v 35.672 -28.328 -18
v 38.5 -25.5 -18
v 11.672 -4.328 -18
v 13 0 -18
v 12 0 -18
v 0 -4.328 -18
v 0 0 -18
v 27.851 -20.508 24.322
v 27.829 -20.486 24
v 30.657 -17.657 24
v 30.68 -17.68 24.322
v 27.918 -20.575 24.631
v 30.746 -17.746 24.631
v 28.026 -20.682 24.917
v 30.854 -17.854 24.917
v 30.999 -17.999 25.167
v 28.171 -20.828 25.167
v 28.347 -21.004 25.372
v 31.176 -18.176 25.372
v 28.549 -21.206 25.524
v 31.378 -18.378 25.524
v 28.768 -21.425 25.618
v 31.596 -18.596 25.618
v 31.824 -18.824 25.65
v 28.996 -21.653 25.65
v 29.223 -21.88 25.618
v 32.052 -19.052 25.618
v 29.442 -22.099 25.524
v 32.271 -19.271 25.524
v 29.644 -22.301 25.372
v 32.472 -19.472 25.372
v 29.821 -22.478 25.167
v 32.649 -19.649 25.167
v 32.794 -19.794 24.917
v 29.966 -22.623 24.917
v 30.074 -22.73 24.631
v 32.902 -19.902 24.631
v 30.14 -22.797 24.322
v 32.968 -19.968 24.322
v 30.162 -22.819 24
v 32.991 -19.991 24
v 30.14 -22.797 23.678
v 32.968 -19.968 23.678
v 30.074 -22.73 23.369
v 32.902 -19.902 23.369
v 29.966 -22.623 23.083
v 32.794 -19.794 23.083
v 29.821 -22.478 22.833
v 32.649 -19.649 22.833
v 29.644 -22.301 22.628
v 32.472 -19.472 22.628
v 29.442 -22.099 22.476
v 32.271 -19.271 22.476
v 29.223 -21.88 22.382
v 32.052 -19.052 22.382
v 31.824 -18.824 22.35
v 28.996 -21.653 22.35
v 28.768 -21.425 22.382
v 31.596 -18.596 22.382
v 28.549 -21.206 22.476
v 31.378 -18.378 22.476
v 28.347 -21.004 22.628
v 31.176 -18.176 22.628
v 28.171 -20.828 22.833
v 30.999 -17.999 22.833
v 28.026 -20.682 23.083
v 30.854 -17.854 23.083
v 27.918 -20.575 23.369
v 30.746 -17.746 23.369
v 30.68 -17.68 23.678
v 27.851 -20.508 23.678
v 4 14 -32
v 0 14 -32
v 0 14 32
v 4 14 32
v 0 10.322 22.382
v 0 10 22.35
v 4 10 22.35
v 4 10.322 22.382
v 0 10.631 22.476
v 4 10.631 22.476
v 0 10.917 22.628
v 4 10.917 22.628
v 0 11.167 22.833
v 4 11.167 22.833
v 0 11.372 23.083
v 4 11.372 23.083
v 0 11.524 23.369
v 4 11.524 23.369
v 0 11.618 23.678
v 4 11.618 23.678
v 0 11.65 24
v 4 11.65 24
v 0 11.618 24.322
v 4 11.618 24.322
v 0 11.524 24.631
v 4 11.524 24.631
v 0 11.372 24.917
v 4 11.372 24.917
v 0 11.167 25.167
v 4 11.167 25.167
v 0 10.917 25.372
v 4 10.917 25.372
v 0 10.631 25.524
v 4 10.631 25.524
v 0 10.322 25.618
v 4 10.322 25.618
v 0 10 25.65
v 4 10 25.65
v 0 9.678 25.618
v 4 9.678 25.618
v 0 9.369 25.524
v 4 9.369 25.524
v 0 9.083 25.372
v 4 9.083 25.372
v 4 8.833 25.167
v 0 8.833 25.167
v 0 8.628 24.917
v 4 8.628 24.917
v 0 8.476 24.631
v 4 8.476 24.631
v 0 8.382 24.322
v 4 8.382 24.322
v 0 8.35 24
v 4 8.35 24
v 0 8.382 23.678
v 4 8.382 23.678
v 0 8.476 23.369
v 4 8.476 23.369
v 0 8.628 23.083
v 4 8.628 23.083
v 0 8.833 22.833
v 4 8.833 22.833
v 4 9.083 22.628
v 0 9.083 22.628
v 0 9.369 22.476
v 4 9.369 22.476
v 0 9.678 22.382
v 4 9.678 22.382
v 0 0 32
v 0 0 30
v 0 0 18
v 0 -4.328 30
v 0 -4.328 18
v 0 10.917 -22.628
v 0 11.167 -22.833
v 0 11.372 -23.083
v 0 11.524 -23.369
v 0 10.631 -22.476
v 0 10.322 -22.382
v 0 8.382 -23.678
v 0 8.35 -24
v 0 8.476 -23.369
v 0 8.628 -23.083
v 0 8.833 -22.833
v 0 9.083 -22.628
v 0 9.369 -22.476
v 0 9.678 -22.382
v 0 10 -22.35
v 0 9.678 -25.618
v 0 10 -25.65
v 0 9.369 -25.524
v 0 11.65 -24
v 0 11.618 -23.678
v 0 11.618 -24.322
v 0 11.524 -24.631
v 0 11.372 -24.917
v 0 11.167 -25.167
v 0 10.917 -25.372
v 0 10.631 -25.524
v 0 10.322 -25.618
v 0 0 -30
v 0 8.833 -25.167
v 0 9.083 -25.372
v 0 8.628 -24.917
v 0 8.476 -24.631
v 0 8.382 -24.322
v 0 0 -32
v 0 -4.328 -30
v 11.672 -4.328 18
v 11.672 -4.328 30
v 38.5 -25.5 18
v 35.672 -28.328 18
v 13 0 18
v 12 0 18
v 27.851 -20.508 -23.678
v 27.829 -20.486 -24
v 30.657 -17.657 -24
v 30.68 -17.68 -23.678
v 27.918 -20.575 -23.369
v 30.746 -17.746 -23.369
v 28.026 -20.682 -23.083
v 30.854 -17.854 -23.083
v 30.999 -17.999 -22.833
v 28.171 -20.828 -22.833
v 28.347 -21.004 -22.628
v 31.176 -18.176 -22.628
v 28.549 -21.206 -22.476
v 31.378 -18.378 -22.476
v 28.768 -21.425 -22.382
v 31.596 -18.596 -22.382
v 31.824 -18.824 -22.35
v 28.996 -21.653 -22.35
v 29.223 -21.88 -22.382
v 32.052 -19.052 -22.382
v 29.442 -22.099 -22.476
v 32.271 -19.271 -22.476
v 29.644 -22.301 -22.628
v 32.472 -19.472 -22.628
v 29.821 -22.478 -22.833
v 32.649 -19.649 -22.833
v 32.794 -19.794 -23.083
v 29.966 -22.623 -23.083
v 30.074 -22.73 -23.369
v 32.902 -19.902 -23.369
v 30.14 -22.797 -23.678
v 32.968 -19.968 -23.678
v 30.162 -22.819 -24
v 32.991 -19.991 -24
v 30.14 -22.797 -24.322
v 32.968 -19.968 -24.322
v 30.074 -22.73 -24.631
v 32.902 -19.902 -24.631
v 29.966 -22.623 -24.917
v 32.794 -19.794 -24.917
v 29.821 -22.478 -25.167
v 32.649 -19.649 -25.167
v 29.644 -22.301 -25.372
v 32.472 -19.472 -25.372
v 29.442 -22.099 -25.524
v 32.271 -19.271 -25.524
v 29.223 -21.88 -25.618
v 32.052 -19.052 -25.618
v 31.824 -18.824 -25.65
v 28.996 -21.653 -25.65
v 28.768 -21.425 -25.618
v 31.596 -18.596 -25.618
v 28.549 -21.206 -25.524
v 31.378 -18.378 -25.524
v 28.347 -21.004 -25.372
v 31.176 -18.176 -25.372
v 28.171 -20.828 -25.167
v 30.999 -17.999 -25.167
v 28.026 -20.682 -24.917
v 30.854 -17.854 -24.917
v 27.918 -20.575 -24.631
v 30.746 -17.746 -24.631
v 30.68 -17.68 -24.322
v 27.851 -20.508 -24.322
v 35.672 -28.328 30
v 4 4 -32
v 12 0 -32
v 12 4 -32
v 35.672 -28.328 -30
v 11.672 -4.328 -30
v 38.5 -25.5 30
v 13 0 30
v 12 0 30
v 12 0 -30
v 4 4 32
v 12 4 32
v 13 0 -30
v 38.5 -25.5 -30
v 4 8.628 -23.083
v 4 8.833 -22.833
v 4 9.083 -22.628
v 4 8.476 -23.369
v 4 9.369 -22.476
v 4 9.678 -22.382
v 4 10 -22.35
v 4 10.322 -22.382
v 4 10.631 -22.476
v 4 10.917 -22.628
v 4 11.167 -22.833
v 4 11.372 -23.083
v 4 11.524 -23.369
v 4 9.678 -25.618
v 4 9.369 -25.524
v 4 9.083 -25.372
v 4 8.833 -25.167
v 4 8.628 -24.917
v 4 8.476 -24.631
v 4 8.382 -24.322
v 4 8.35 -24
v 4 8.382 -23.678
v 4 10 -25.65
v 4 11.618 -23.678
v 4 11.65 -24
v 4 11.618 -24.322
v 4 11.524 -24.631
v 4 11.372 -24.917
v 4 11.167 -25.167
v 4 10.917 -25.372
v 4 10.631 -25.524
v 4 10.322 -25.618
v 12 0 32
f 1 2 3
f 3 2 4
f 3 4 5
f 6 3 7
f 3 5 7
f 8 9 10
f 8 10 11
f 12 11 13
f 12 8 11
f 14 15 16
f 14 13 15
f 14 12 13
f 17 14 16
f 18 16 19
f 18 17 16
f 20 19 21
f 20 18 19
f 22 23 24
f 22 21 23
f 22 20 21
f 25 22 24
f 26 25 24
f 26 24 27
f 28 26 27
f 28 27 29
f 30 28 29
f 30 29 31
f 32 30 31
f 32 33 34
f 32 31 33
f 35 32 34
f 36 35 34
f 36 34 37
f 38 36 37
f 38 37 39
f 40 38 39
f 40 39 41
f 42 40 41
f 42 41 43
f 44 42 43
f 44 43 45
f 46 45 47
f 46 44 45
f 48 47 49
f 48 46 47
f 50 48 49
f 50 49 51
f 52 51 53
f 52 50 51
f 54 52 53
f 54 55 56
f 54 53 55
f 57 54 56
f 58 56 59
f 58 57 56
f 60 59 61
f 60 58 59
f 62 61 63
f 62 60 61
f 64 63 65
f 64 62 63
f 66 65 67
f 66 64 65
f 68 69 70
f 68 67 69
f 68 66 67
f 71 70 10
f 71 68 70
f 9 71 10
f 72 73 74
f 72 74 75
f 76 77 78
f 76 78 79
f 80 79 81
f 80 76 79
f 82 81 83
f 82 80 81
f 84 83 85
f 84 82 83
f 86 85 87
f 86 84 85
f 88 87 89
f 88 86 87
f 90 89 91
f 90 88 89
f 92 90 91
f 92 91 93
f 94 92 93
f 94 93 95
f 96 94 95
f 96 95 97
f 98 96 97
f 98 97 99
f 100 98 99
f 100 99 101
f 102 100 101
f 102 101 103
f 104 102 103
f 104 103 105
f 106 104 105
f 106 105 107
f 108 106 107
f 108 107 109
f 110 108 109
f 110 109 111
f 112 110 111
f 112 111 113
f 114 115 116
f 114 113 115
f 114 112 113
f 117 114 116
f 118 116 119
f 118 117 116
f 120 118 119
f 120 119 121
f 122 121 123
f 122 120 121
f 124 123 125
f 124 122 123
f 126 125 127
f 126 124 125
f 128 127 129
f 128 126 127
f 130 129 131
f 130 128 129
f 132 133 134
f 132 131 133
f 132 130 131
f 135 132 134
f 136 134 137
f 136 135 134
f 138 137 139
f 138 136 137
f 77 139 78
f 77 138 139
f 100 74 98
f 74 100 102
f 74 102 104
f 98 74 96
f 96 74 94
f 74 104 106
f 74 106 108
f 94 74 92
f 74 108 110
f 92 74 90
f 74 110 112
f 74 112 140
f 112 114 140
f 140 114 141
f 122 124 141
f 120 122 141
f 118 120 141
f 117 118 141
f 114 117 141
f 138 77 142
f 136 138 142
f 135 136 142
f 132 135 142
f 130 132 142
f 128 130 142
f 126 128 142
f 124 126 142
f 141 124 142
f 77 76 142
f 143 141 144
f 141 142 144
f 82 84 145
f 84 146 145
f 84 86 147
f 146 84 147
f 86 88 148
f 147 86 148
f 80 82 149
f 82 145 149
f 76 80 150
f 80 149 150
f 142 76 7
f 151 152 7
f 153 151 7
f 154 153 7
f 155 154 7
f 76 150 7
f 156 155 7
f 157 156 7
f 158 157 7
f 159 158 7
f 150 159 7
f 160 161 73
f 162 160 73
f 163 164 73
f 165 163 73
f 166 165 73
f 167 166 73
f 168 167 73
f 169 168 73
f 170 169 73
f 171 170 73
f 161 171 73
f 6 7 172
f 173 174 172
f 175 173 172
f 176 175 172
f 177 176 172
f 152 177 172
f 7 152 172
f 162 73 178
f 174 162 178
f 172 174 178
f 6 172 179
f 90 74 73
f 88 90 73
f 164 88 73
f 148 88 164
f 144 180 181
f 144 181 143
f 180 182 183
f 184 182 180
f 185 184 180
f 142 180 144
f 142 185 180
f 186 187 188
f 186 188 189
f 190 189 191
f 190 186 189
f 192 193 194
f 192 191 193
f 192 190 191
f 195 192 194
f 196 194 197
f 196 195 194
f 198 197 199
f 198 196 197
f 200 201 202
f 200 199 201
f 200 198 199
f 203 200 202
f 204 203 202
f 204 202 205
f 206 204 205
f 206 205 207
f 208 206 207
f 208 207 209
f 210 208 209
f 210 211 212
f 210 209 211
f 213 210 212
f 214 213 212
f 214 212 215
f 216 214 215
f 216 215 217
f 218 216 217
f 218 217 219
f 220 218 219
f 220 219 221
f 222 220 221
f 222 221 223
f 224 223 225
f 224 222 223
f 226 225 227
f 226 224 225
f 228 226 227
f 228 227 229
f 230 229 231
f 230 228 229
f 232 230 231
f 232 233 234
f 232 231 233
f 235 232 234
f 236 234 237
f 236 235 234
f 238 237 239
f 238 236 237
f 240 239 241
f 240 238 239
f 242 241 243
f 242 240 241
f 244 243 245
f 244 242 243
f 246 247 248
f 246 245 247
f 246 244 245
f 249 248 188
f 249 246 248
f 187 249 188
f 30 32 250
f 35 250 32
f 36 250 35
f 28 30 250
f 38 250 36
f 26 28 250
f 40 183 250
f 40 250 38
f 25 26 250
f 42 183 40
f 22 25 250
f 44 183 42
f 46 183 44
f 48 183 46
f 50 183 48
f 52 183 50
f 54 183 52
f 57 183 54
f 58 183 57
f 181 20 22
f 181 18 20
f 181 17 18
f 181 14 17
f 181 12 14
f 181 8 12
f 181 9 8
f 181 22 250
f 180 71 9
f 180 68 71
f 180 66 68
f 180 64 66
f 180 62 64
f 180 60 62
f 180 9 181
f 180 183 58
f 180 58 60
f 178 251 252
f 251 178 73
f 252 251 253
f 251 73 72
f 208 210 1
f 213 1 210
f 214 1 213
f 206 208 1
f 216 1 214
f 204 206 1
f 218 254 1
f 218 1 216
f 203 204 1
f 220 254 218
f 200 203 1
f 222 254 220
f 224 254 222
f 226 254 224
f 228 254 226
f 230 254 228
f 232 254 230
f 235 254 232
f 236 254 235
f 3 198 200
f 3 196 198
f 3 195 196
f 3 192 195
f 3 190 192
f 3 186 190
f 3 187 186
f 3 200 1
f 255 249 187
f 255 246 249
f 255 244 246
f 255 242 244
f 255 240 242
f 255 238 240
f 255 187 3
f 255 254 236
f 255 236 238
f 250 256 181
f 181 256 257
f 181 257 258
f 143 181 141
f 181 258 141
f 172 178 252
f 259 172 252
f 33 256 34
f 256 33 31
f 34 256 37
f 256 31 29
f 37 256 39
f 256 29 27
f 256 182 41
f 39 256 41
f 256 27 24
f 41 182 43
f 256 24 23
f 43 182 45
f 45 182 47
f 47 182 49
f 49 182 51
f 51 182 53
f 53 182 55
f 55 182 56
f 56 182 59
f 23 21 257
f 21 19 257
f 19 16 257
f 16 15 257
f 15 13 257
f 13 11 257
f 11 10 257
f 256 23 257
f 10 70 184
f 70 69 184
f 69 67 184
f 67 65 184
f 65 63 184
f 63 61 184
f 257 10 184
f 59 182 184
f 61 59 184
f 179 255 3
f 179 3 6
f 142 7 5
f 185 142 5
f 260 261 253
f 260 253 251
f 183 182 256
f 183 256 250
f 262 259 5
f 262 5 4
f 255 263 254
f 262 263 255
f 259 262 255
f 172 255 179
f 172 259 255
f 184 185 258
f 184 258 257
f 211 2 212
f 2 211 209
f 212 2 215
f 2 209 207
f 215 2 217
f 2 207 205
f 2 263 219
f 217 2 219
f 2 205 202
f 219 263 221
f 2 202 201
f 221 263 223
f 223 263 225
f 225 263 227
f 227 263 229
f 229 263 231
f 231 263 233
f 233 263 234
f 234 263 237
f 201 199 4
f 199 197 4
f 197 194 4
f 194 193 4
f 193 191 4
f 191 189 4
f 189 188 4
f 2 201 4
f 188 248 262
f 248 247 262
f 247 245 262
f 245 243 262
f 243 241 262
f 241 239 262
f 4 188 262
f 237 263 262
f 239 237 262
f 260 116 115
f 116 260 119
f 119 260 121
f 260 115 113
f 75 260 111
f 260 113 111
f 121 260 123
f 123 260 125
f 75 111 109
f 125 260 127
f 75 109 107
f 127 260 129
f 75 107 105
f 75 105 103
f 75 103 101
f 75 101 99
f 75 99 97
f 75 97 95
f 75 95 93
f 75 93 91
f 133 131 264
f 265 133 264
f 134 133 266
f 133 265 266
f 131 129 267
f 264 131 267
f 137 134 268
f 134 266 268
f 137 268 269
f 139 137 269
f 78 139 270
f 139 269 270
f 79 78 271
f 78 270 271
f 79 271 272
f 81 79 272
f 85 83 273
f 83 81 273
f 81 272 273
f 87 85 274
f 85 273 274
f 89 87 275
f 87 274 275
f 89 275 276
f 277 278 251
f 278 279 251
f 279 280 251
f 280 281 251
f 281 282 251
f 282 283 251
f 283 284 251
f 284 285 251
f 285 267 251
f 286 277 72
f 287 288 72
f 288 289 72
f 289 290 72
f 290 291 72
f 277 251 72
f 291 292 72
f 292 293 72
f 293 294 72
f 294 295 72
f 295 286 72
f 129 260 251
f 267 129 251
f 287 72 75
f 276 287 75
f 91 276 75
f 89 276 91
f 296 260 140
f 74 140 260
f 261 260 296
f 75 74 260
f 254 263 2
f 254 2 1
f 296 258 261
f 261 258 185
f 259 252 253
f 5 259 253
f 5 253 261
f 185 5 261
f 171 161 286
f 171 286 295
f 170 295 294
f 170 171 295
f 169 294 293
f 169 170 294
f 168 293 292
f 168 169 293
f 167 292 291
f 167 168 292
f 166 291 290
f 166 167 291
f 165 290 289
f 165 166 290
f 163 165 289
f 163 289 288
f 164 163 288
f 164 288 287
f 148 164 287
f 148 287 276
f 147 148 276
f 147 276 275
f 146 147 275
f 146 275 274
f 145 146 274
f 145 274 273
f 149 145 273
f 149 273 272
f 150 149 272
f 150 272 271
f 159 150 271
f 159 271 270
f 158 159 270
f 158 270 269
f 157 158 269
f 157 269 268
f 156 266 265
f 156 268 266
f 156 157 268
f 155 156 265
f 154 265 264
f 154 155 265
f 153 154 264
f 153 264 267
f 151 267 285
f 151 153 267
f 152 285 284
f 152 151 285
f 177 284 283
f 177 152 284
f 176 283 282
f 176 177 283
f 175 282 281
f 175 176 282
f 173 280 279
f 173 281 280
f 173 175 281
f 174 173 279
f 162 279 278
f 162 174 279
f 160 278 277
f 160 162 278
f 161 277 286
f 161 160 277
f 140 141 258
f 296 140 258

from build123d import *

# Parameters (mm, degrees)
FDM_4MM_START                 = -32
FDM_4MM_DEPTH                 = 64
EXTRUDE_START                 = -30
EXTRUDE_45_1_DEPTH            = 12
CUT_EXTRUDE_M3_1_DEPTH        = 100
CUT_EXTRUDE_M3_1_DEPTH_BACK   = 100
SKETCH_3_R                    = 1.65
EXTRUDE_START_2               = 18
EXTRUDE_45_1_2_DEPTH          = 12
CUT_EXTRUDE_M3_1_2_DEPTH      = 100
CUT_EXTRUDE_M3_1_2_DEPTH_BACK = 100
SKETCH_5_R                    = 1.65
CUT_EXTRUDE_M3_1_3_DEPTH      = 100
CUT_EXTRUDE_M3_1_3_DEPTH_BACK = 100
SKETCH_6_R                    = 1.65
CUT_EXTRUDE_M3_1_4_DEPTH      = 100
CUT_EXTRUDE_M3_1_4_DEPTH_BACK = 100
SKETCH_7_R                    = 1.65


with BuildPart() as part:
    # 草图1 → FDM侧板连接根部_4mm壁 (new body)
    with BuildSketch(Plane.XY.offset(FDM_4MM_START)):
        Polygon((0, 0), (12, 0), (12, 4), (4, 4), (4, 14), (0, 14), align=None)
    extrude(amount=FDM_4MM_DEPTH)

    # 草图2 → Extrude 45__-1 (add)
    with BuildSketch(Plane.XY.offset(EXTRUDE_START)):
        Polygon((0, 0), (0, 14), (4, 14), (4, 0), (13, 0), (14.5, -1.5), (38.5, -25.5), (35.671572875, -28.328427125), (11.671572875, -4.328427125), (0, -4.328427125), align=None)
    extrude(amount=EXTRUDE_45_1_DEPTH)

    # 草图3 → Cut-Extrude M3__-1 (cut, two sides: drawn at the far end of the back side and taken through both)
    with BuildSketch(Plane(origin=(0, 0, 0), x_dir=(0, 0, -1), z_dir=(1, 0, 0)).offset(-CUT_EXTRUDE_M3_1_DEPTH_BACK)):
        with Locations((24, 10)):
            Circle(SKETCH_3_R)
    extrude(amount=CUT_EXTRUDE_M3_1_DEPTH + CUT_EXTRUDE_M3_1_DEPTH_BACK, mode=Mode.SUBTRACT)

    # 草图4 → Extrude 45__1 2 (add)
    with BuildSketch(Plane.XY.offset(EXTRUDE_START_2)):
        Polygon((0, 0), (0, 14), (4, 14), (4, 0), (13, 0), (14.5, -1.5), (38.5, -25.5), (35.671572875, -28.328427125), (11.671572875, -4.328427125), (0, -4.328427125), align=None)
    extrude(amount=EXTRUDE_45_1_2_DEPTH)

    # 草图5 → Cut-Extrude M3__1 2 (cut, two sides: drawn at the far end of the back side and taken through both)
    with BuildSketch(Plane(origin=(0, 0, 0), x_dir=(0, 0, -1), z_dir=(1, 0, 0)).offset(-CUT_EXTRUDE_M3_1_2_DEPTH_BACK)):
        with Locations((-24, 10)):
            Circle(SKETCH_5_R)
    extrude(amount=CUT_EXTRUDE_M3_1_2_DEPTH + CUT_EXTRUDE_M3_1_2_DEPTH_BACK, mode=Mode.SUBTRACT)

    # 草图6 → Cut-Extrude M3_-1 3 (cut, two sides: drawn at the far end of the back side and taken through both)
    with BuildSketch(Plane(origin=(6.5, 6.5, 0), x_dir=(0, 0, -1), z_dir=(0.7071067811865472, 0.7071067811865479, 0)).offset(-CUT_EXTRUDE_M3_1_3_DEPTH_BACK)):
        with Locations(Location((24, -35.813708499, 0), (0, 0, 90))):
            Circle(SKETCH_6_R)
    extrude(amount=CUT_EXTRUDE_M3_1_3_DEPTH + CUT_EXTRUDE_M3_1_3_DEPTH_BACK, mode=Mode.SUBTRACT)

    # 草图7 → Cut-Extrude M3_1 4 (cut, two sides: drawn at the far end of the back side and taken through both)
    with BuildSketch(Plane(origin=(6.5, 6.5, 0), x_dir=(0, 0, -1), z_dir=(0.7071067811865472, 0.7071067811865479, 0)).offset(-CUT_EXTRUDE_M3_1_4_DEPTH_BACK)):
        with Locations(Location((-24, -35.813708499, 0), (0, 0, 90))):
            Circle(SKETCH_7_R)
    extrude(amount=CUT_EXTRUDE_M3_1_4_DEPTH + CUT_EXTRUDE_M3_1_4_DEPTH_BACK, mode=Mode.SUBTRACT)


solid = part.part
